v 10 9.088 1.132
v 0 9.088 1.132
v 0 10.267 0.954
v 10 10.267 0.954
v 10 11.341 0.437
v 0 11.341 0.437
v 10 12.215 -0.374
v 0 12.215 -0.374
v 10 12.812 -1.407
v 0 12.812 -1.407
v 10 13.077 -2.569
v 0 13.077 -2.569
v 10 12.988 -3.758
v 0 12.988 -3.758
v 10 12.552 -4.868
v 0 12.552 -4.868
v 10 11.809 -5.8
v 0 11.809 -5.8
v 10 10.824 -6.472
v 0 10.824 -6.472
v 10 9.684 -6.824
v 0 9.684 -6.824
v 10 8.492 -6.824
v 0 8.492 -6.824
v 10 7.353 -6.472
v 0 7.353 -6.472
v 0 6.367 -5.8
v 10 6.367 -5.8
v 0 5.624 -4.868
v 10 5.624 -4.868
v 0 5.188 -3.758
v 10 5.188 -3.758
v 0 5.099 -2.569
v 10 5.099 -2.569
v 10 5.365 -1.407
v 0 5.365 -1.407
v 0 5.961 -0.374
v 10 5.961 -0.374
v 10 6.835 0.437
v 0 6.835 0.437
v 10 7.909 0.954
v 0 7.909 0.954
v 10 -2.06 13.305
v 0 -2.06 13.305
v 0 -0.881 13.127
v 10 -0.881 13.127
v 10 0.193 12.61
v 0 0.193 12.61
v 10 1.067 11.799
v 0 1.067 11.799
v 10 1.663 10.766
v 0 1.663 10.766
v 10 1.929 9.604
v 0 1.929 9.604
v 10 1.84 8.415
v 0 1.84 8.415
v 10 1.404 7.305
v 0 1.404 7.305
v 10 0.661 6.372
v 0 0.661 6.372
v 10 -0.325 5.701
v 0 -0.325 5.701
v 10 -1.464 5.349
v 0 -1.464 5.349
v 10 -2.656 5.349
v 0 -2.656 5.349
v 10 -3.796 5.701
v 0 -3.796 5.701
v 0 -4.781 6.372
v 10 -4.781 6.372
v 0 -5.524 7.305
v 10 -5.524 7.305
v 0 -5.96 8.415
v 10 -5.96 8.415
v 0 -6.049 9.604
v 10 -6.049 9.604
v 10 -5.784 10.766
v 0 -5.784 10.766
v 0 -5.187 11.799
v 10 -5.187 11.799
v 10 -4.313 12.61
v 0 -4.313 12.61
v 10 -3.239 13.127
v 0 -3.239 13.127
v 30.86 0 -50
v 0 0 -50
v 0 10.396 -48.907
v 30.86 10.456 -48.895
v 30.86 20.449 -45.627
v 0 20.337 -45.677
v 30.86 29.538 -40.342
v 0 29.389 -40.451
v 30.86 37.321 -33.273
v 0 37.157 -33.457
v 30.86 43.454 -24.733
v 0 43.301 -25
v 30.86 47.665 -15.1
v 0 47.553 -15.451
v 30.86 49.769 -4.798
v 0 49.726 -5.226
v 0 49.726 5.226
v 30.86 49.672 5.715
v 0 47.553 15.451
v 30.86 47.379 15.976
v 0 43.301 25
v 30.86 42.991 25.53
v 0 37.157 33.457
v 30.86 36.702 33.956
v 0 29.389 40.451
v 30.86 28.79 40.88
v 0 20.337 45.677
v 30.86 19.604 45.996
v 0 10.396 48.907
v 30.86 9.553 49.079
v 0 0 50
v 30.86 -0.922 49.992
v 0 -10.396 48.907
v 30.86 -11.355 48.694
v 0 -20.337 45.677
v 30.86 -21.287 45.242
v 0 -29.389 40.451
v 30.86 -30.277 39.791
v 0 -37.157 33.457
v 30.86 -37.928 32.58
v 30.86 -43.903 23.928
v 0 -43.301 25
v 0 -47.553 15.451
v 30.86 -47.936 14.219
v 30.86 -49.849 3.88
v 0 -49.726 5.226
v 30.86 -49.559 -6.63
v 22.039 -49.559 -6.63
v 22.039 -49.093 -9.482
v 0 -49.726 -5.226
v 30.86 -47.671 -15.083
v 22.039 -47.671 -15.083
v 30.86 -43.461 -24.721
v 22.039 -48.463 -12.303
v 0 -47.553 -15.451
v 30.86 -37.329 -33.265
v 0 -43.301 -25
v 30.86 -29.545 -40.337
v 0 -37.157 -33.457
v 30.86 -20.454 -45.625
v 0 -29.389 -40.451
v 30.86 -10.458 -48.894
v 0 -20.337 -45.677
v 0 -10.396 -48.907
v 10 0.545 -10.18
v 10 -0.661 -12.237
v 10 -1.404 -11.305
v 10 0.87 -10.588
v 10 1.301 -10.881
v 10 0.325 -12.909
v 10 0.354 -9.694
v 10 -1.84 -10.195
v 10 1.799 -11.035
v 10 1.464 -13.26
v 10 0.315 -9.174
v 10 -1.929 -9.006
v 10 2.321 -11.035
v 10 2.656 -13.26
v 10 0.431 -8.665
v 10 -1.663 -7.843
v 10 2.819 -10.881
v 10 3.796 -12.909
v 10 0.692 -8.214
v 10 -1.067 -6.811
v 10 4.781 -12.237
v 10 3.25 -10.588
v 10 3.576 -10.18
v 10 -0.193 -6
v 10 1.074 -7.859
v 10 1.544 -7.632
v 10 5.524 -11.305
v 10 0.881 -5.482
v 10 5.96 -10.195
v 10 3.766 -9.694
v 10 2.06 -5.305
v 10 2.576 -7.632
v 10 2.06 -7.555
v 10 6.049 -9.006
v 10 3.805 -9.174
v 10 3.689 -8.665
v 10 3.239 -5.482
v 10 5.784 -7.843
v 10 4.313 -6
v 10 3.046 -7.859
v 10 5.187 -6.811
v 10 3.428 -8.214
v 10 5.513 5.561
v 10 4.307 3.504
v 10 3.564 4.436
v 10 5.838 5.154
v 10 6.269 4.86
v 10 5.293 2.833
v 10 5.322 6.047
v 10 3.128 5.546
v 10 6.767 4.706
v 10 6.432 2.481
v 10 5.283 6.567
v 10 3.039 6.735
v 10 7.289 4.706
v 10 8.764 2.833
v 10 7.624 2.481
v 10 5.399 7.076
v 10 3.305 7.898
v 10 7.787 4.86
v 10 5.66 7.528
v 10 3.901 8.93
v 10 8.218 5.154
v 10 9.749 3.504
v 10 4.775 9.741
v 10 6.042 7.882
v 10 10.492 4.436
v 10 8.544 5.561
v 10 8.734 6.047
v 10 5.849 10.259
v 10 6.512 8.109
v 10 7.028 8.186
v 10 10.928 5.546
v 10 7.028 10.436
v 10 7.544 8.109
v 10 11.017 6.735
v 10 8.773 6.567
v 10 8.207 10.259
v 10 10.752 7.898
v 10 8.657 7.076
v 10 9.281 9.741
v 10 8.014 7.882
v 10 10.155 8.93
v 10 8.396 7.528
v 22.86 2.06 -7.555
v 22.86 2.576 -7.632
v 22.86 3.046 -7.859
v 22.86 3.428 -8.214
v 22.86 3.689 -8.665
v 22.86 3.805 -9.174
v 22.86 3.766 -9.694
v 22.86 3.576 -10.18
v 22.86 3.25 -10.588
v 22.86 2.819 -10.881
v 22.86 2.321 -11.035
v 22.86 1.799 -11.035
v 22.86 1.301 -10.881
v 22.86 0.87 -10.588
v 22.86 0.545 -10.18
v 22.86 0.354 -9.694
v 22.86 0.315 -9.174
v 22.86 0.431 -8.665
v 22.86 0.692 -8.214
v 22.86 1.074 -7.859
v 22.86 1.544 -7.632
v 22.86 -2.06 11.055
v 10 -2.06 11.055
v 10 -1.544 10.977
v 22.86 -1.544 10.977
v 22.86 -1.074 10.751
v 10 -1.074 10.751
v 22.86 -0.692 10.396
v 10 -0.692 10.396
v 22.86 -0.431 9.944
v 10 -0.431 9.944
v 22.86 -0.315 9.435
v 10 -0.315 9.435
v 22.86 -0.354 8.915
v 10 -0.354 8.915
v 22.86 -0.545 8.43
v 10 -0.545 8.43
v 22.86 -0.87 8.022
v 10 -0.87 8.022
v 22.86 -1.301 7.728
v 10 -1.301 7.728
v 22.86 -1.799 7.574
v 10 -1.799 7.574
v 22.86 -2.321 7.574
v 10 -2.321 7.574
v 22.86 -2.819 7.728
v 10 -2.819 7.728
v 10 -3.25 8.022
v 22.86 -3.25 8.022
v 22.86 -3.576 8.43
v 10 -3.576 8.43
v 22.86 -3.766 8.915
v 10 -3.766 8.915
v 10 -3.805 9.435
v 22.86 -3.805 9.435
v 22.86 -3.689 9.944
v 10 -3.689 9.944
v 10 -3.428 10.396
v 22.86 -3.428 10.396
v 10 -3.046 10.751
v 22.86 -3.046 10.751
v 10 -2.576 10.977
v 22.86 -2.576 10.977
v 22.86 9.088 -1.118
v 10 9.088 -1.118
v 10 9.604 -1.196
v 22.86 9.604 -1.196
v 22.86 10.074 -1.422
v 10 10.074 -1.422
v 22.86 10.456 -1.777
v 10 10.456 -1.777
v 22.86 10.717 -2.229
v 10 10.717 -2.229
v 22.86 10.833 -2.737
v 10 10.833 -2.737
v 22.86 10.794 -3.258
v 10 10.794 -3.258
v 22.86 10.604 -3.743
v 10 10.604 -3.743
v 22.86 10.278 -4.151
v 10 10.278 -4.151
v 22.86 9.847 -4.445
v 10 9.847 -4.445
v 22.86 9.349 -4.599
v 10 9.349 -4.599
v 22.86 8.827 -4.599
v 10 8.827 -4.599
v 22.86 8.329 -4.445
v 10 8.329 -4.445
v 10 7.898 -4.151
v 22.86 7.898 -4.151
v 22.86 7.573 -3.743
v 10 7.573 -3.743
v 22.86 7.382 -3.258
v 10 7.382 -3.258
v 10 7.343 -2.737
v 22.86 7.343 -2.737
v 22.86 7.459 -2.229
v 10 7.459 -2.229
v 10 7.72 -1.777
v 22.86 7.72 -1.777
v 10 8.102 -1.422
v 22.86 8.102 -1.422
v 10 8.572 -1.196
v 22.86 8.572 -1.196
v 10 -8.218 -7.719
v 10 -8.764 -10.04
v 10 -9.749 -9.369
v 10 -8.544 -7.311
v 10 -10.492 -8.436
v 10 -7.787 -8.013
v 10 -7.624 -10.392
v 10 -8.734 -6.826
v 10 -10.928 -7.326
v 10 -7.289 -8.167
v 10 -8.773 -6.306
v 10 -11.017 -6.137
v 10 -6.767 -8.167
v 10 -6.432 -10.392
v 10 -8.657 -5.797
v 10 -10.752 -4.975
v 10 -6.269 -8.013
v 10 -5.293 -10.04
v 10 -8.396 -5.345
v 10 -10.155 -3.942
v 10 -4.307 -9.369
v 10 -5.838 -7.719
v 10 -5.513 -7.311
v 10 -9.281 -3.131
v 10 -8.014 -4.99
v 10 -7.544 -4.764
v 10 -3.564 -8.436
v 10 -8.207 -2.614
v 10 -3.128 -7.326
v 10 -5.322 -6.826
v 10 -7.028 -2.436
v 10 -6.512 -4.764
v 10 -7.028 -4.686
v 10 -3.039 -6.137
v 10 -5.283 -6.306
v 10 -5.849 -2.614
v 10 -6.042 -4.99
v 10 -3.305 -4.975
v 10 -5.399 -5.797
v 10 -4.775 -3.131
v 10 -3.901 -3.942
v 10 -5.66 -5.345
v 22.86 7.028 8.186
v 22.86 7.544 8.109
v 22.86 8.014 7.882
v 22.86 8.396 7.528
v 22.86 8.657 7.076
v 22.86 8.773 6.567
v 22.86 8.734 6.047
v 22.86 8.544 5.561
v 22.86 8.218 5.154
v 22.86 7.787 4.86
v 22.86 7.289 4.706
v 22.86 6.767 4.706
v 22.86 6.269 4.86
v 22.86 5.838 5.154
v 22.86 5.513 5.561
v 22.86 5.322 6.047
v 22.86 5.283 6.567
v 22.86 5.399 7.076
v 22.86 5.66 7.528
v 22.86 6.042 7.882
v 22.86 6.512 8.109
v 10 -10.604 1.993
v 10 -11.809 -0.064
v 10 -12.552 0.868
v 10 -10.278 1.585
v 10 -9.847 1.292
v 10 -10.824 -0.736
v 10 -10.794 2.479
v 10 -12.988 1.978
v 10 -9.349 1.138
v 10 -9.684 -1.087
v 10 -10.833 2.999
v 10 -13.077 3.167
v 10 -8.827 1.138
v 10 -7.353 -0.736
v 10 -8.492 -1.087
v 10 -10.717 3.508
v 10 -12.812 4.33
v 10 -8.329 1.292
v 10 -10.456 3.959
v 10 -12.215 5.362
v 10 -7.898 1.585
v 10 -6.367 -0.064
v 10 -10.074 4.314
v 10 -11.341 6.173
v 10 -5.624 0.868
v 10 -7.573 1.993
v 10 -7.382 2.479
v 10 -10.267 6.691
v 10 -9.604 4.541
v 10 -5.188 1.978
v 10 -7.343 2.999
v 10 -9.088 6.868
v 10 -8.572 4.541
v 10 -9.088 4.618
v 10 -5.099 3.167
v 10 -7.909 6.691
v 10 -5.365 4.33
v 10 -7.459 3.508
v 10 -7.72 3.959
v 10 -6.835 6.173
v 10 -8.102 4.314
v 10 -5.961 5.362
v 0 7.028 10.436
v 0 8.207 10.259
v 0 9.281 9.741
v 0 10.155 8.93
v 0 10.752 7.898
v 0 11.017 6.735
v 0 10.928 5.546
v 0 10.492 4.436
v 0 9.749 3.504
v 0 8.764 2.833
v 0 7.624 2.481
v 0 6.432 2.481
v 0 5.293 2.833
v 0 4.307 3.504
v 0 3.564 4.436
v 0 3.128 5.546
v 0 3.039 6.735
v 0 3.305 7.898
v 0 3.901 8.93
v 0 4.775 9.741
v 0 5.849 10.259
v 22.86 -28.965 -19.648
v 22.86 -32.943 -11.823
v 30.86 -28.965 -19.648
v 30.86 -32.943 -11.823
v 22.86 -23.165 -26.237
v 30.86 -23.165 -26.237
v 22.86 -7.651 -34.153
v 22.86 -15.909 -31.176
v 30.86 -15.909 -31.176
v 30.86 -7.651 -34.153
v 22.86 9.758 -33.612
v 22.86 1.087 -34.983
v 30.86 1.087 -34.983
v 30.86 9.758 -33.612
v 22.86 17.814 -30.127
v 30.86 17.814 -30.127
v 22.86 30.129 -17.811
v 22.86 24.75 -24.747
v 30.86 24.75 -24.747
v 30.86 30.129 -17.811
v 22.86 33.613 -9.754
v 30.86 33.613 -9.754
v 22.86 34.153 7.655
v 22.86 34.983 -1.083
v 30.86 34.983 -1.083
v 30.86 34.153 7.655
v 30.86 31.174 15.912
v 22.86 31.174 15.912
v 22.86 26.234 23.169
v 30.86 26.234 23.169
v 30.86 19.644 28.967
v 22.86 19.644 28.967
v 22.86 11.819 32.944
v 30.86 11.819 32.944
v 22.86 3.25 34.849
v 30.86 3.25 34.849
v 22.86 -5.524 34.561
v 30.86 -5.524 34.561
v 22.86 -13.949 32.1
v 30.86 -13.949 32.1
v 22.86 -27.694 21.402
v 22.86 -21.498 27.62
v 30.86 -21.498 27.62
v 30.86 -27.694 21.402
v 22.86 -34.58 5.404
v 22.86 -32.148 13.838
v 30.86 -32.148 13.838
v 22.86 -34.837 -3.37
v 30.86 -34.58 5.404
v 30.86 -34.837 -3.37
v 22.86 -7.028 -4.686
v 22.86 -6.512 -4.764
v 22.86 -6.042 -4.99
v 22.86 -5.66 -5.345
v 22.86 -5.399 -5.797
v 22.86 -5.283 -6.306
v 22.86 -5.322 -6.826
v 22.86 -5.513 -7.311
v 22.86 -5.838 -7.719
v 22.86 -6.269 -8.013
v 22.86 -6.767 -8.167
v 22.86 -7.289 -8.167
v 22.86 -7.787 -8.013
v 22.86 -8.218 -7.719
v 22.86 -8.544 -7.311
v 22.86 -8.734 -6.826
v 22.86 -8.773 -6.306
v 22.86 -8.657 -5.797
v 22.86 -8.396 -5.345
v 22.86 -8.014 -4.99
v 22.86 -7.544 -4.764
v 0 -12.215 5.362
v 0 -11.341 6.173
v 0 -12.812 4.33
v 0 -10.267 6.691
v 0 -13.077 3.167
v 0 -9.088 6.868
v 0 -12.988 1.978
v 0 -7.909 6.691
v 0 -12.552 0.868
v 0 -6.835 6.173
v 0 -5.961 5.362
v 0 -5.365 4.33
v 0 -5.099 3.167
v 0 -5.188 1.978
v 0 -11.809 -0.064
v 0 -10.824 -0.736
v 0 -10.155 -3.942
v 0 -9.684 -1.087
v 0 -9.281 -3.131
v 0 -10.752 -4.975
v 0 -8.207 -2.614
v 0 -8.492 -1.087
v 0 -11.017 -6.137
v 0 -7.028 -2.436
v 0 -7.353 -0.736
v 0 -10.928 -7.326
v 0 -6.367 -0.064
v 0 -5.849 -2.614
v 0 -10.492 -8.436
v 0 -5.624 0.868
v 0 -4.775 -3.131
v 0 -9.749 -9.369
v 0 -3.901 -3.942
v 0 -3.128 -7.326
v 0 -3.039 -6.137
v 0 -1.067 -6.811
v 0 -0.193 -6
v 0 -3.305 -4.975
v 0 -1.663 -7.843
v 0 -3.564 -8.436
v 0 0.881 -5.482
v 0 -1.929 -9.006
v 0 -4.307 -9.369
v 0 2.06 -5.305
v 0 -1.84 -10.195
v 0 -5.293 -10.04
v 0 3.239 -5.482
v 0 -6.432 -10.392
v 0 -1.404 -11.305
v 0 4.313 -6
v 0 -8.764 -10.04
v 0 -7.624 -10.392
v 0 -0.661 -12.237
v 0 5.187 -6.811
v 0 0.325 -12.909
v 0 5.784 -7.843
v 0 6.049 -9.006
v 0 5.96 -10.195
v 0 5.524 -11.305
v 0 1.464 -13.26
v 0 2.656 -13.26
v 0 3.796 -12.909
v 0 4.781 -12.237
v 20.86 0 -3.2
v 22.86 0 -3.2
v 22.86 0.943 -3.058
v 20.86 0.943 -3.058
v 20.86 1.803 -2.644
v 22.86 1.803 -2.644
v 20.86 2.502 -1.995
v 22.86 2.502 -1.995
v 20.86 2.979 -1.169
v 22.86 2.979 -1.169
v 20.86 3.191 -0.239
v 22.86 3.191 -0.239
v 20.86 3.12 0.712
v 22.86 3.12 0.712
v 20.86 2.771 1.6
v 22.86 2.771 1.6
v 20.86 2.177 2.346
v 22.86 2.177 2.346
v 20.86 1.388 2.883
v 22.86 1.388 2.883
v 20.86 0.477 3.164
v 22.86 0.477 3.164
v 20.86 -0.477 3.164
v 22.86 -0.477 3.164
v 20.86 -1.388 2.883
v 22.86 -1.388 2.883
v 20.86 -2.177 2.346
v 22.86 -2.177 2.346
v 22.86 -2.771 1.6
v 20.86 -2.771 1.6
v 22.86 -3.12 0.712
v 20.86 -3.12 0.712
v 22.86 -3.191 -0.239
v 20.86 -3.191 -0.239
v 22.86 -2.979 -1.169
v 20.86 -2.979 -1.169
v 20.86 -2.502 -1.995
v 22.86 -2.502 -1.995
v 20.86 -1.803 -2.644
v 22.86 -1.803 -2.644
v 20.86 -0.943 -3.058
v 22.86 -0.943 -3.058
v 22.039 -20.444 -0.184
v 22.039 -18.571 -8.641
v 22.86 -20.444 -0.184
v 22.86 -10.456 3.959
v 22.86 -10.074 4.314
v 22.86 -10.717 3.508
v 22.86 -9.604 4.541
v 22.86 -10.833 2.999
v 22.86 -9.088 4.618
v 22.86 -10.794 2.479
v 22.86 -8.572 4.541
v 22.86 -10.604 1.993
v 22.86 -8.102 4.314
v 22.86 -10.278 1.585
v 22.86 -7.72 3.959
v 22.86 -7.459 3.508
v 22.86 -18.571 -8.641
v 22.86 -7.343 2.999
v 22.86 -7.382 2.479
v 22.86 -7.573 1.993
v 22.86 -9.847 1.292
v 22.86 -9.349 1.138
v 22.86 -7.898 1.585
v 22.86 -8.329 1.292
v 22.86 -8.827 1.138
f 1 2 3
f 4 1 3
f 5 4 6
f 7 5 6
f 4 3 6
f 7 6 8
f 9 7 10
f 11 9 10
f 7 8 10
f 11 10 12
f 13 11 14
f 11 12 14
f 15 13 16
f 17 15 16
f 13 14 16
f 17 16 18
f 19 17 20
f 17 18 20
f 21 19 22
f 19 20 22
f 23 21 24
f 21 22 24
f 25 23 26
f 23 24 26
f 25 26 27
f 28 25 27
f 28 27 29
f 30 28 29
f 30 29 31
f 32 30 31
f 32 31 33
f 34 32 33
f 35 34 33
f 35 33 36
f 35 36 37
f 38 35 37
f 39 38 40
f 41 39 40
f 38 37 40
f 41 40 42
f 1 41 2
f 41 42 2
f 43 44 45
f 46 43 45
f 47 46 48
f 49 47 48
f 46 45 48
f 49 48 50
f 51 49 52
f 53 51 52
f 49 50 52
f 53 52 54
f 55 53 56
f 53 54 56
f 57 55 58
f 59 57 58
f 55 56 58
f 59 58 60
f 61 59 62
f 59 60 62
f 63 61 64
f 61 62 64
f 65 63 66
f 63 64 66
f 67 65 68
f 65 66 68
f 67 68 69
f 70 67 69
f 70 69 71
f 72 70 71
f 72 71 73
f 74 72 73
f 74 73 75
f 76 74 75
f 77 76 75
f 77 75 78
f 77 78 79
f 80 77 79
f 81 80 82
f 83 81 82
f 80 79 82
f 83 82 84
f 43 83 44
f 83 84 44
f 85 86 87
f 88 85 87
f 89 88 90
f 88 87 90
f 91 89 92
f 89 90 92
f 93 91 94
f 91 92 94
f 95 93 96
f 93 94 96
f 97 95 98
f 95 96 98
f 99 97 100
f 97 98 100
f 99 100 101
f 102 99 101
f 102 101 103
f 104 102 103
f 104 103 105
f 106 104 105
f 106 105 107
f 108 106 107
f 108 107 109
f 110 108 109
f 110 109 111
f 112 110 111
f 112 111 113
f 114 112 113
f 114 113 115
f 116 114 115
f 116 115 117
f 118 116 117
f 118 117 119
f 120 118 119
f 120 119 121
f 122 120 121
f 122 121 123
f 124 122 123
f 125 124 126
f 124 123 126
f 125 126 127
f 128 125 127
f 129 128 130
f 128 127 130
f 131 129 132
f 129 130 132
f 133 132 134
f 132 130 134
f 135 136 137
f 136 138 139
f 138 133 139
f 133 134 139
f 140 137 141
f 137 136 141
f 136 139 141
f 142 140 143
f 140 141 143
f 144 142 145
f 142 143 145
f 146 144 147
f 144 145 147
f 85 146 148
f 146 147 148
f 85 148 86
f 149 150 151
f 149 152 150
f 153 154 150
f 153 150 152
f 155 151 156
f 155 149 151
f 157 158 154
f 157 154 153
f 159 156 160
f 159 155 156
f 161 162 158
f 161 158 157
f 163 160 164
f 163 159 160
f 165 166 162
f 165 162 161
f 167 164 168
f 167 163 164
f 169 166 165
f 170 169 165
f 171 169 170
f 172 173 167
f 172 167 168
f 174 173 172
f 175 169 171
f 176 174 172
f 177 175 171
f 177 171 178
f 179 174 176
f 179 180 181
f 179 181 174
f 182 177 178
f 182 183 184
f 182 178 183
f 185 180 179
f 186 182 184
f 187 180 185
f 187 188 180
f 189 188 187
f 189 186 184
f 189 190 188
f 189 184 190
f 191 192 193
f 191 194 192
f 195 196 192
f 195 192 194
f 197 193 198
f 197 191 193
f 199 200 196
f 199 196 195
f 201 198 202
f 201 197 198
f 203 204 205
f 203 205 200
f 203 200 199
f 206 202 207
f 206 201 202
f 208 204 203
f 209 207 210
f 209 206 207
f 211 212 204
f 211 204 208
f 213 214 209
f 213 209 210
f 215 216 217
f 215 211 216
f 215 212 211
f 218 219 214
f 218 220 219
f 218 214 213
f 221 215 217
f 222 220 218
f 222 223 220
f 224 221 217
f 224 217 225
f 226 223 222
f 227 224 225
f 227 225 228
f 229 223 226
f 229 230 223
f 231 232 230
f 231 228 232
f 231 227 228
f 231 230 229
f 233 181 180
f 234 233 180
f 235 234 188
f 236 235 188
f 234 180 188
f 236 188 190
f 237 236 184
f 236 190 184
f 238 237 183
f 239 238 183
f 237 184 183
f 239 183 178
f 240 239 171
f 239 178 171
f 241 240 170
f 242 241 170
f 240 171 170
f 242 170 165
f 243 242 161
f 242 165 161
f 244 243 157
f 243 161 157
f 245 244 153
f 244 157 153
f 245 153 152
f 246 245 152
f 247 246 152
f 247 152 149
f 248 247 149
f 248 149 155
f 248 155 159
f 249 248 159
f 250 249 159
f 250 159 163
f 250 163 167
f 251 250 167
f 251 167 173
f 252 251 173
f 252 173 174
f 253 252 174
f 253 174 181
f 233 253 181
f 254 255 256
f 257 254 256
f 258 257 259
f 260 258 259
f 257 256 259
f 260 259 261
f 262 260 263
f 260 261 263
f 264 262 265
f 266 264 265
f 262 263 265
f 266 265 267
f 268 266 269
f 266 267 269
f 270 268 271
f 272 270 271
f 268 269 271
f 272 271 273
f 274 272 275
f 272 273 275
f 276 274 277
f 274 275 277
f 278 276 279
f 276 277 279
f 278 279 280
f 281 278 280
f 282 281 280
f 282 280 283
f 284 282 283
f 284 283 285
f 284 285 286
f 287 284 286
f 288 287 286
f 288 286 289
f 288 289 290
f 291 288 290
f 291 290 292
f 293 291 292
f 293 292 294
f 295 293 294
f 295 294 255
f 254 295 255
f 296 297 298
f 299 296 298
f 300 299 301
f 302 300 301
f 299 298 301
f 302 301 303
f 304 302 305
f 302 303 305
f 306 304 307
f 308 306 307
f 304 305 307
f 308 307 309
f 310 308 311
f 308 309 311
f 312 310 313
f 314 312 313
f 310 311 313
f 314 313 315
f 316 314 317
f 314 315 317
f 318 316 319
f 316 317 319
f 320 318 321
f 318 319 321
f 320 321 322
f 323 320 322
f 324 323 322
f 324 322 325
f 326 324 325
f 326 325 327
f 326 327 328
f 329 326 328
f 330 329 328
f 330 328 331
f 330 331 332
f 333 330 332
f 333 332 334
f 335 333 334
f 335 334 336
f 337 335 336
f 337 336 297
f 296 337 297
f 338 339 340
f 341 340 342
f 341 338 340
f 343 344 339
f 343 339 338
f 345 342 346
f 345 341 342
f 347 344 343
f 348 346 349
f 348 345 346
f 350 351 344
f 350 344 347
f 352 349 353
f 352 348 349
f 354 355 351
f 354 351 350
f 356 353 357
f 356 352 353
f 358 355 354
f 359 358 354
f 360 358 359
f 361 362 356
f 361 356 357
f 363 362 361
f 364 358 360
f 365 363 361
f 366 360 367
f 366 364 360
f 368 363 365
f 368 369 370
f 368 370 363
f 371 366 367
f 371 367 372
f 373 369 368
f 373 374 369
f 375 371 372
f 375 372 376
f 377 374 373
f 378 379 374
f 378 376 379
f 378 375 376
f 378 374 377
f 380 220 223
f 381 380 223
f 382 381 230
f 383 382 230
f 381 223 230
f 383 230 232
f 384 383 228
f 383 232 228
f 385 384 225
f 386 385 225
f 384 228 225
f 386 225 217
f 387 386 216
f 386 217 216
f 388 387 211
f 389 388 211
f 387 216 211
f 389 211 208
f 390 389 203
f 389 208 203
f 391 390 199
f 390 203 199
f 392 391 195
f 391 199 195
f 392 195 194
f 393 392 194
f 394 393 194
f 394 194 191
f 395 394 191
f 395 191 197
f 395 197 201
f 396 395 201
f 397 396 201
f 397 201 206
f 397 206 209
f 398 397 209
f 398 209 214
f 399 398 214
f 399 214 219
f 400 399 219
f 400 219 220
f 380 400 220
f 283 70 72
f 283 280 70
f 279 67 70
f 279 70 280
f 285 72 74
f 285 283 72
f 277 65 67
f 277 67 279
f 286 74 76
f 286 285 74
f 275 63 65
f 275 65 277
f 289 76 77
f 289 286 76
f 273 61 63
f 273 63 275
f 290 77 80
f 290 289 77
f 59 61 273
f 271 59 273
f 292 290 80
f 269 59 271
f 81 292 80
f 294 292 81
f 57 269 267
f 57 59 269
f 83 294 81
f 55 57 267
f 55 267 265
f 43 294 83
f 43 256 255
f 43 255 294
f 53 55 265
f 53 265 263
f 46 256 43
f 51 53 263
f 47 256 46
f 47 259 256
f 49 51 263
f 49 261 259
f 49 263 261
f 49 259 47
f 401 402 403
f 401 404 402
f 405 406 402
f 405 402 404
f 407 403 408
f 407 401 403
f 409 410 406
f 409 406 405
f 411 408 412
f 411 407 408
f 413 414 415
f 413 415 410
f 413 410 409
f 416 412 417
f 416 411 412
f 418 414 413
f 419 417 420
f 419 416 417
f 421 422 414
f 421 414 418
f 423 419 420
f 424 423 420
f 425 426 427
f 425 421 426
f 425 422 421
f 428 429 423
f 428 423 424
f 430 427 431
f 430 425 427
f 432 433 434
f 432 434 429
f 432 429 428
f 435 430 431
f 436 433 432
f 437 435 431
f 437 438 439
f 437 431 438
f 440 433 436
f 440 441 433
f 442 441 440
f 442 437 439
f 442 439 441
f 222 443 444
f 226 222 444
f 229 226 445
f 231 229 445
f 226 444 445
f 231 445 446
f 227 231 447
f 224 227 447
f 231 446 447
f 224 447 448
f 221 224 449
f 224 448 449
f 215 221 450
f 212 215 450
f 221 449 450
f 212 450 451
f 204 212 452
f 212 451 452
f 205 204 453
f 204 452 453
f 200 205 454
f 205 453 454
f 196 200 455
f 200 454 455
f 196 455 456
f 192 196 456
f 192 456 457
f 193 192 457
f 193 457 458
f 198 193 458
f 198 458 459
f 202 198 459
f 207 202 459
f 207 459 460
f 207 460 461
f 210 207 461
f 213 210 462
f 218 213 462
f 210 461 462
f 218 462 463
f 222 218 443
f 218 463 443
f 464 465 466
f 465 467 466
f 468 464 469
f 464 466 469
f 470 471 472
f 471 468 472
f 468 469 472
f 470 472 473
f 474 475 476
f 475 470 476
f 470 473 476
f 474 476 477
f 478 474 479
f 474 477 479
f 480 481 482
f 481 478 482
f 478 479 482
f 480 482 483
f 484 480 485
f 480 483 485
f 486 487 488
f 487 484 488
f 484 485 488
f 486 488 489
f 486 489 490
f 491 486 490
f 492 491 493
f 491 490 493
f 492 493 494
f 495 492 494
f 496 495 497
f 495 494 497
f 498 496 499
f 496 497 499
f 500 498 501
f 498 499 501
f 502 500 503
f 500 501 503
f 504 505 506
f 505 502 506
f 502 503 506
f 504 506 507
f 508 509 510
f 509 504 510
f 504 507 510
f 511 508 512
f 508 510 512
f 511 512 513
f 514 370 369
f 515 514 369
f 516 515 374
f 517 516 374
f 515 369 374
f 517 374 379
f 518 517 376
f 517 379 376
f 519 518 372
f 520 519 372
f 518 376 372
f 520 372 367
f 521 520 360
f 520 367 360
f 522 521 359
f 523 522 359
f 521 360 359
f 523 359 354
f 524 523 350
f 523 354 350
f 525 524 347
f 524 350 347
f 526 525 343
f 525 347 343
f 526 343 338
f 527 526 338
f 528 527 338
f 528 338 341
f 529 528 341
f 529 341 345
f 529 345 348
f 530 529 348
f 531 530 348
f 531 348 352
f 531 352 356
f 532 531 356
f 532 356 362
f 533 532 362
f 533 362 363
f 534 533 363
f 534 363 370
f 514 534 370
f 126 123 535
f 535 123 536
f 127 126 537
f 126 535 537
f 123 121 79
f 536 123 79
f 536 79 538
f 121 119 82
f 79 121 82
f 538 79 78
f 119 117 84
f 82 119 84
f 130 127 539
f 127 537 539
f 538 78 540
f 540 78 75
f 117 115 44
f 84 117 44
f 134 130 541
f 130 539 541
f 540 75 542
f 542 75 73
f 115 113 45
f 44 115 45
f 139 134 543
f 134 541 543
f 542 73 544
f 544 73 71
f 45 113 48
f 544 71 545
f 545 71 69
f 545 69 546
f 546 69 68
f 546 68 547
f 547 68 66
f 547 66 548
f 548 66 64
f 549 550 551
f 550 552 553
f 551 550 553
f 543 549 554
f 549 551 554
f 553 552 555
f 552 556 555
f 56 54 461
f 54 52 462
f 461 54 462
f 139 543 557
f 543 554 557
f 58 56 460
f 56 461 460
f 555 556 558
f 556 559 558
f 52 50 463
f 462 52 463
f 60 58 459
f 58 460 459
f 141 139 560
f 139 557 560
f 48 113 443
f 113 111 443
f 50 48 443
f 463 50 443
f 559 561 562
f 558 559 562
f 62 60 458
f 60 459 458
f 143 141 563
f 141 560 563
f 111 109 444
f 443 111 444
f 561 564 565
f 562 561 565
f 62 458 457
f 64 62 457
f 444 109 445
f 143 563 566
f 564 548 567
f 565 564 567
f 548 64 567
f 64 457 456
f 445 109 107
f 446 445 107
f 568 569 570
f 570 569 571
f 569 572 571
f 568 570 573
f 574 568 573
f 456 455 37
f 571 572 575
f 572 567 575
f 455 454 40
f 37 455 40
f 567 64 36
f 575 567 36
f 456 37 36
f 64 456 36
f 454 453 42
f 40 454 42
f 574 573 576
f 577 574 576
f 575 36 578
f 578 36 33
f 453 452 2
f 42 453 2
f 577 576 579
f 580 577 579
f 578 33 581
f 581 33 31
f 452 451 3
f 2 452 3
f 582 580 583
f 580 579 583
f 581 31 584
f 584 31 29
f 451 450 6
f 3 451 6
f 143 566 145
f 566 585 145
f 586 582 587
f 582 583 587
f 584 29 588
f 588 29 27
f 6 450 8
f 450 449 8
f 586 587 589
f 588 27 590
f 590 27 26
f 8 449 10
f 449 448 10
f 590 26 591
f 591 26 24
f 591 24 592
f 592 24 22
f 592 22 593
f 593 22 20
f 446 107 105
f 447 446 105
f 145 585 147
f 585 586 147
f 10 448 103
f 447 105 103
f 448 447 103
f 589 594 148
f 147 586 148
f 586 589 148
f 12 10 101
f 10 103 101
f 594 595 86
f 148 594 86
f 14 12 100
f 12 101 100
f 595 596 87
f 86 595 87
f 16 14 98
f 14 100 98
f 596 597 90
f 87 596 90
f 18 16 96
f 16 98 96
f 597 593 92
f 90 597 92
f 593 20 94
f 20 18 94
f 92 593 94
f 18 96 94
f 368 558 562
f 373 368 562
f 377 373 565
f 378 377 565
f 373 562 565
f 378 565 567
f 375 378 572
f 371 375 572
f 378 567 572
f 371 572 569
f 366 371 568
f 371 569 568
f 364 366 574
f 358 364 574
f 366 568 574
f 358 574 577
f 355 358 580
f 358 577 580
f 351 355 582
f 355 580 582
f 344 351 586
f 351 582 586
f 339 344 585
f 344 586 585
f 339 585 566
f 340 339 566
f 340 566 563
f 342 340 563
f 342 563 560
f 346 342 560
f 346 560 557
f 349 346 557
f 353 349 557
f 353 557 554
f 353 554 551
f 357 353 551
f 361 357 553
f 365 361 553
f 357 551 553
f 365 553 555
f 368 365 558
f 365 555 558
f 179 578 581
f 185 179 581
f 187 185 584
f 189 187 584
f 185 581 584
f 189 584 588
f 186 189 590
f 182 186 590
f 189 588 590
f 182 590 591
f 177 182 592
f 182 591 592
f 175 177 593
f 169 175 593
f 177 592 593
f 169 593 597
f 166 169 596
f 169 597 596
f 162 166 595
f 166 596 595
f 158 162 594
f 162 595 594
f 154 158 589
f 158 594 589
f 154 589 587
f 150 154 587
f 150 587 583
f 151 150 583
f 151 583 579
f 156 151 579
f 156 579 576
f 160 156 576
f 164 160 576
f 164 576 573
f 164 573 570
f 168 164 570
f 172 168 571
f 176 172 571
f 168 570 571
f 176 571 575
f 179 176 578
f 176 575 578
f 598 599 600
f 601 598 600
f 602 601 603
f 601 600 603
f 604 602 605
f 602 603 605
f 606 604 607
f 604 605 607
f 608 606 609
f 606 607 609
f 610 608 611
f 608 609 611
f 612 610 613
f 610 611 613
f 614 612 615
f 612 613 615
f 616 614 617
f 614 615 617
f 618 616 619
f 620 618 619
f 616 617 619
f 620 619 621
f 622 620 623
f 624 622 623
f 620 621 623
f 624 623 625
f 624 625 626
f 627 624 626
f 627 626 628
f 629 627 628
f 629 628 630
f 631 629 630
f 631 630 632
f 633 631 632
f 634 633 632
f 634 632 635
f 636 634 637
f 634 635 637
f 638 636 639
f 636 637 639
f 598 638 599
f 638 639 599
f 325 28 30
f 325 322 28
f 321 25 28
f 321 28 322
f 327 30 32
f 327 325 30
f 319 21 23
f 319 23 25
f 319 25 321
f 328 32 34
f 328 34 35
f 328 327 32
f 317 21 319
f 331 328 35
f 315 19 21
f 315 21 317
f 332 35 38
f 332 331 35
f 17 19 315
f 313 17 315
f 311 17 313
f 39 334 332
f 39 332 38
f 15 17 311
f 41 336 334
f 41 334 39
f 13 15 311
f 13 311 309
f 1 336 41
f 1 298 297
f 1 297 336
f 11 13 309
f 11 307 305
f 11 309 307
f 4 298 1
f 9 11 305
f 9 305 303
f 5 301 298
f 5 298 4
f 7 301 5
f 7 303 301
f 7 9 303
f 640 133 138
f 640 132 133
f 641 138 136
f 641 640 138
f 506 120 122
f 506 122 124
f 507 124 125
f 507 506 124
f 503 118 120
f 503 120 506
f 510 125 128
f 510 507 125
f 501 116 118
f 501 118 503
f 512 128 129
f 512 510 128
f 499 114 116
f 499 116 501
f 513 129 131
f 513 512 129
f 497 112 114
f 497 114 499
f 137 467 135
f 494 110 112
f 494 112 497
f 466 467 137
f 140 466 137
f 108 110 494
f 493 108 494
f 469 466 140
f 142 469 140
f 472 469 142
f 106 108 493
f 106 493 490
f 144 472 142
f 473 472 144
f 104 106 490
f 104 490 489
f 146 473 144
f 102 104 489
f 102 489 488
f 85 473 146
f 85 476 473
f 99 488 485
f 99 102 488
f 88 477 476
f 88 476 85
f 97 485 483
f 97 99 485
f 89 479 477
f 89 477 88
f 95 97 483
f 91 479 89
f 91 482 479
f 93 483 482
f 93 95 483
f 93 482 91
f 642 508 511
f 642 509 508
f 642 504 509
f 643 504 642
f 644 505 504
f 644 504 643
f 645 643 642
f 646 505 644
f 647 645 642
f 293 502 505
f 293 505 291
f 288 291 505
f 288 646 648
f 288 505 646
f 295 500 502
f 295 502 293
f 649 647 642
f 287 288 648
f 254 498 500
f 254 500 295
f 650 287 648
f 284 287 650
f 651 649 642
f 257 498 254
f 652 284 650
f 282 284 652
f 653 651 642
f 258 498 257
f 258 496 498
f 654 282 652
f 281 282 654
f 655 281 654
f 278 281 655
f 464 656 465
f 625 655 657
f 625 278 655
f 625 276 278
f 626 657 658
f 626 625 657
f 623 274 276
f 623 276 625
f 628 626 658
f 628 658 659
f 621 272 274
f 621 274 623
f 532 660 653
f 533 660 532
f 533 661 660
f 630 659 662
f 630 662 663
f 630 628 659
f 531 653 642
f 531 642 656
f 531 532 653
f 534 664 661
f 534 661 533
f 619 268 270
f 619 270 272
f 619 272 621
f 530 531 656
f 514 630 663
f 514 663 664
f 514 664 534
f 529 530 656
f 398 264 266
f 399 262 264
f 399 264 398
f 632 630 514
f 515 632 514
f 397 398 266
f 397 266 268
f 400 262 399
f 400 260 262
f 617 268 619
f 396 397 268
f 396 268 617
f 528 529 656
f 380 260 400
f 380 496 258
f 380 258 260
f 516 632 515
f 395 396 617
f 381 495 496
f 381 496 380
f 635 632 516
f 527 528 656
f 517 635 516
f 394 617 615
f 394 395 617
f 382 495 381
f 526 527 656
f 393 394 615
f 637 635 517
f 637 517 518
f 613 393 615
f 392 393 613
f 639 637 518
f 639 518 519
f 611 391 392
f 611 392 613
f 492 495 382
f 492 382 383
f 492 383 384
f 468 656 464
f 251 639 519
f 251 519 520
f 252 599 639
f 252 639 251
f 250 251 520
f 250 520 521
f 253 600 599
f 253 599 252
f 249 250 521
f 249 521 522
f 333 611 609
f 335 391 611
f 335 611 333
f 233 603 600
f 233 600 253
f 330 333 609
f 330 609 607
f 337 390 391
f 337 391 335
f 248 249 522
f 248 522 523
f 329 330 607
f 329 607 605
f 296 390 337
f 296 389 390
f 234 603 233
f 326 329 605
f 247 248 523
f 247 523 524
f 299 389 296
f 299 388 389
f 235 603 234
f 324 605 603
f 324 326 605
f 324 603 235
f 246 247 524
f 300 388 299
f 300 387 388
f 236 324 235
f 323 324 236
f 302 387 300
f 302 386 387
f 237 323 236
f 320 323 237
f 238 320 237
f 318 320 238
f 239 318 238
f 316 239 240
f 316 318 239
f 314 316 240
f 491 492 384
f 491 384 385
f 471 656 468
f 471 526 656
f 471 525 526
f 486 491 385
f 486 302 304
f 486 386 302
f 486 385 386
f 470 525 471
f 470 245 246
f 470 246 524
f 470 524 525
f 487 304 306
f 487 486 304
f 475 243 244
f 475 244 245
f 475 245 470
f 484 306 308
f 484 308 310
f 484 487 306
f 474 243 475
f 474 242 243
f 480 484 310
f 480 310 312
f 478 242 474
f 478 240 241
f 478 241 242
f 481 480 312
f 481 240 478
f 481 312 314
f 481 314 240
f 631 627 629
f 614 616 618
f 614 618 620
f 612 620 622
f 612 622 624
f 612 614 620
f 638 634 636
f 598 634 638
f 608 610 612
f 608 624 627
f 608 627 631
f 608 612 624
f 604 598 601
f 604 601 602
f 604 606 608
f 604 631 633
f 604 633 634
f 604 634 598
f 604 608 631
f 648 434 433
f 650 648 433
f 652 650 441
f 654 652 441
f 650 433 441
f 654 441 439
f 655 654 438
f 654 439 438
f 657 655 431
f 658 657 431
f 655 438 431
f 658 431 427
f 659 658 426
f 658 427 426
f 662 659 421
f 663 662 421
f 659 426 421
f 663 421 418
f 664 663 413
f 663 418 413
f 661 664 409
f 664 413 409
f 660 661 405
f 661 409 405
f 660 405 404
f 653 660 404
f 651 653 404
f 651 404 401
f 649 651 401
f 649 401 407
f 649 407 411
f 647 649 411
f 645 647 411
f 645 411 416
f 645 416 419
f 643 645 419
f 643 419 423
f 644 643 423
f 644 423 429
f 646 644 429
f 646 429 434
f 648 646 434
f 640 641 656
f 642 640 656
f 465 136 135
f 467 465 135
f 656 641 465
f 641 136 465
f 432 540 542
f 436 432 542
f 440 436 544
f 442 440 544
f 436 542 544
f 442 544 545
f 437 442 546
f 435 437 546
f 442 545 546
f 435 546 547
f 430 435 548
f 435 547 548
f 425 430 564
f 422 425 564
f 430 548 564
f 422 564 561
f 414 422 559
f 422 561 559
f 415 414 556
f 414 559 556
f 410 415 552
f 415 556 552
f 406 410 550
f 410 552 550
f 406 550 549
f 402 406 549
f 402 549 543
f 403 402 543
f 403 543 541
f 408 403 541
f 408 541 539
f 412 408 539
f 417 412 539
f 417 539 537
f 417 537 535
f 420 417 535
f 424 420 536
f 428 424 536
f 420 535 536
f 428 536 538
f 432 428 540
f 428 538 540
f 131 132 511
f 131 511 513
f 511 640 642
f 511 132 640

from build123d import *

# Parameters (mm, degrees)
SKETCH1_R           = 50
BOSS_EXTRUDE1_DEPTH = 30.86
SKETCH2_R           = 35
CUT_EXTRUDE1_DEPTH  = 8
CUT_EXTRUDE4_START  = -20
SKETCH10_W          = 10.01875972
SKETCH10_H          = 8.661840267
CUT_EXTRUDE4_DEPTH  = 60
SKETCH12_R          = 3.2
CUT_EXTRUDE5_DEPTH  = 2
SKETCH5_R           = 1.75
CUT_EXTRUDE3_DEPTH  = 30
SKETCH8_R           = 4
CUT_EXTRUDE6_DEPTH  = 10


with BuildPart() as part:
    # Sketch1 → Boss-Extrude1 (new body)
    with BuildSketch(Plane(origin=(0, 0, 0), x_dir=(0, 0, -1), z_dir=(1, 0, 0))):
        Circle(SKETCH1_R)
    extrude(amount=BOSS_EXTRUDE1_DEPTH)

    # Sketch2 → Cut-Extrude1 (cut)
    with BuildSketch(Plane(origin=(30.86, 0, 0), x_dir=(0, 0, -1), z_dir=(1, 0, 0))):
        Circle(SKETCH2_R)
    extrude(amount=-CUT_EXTRUDE1_DEPTH, mode=Mode.SUBTRACT)

    # Sketch10 → Cut-Extrude4 (cut)
    with BuildSketch(Plane(origin=(0, 0, 0), x_dir=(1, 0, 0), z_dir=(0, 0.9763565991877232, 0.2161661195066977)).offset(CUT_EXTRUDE4_START)):
        with Locations((27.048757514, 0.091052199)):
            Rectangle(SKETCH10_W, SKETCH10_H)
    extrude(amount=-CUT_EXTRUDE4_DEPTH, mode=Mode.SUBTRACT)

    # Sketch12 → Cut-Extrude5 (cut)
    with BuildSketch(Plane(origin=(22.86, 0, 0), x_dir=(0, 0, -1), z_dir=(1, 0, 0))):
        Circle(SKETCH12_R)
    extrude(amount=-CUT_EXTRUDE5_DEPTH, mode=Mode.SUBTRACT)

    # Sketch5 → Cut-Extrude3 (cut)
    with BuildSketch(Plane.ZY):
        with Locations((2.868272201, -9.088119419)):
            Circle(SKETCH5_R)
        with Locations((-6.436406189, -7.028056301)):
            Circle(SKETCH5_R)
        with Locations((-9.30467839, 2.060063119)):
            Circle(SKETCH5_R)
        with Locations((-2.868272201, 9.088119419)):
            Circle(SKETCH5_R)
        with Locations((6.436406189, 7.028056301)):
            Circle(SKETCH5_R)
        with Locations((9.30467839, -2.060063119)):
            Circle(SKETCH5_R)
    extrude(amount=-CUT_EXTRUDE3_DEPTH, mode=Mode.SUBTRACT)

    # Sketch8 → Cut-Extrude6 (cut)
    with BuildSketch(Plane.ZY):
        with Locations((-2.868272201, 9.088119419)):
            Circle(SKETCH8_R)
        with Locations((6.436406189, 7.028056301)):
            Circle(SKETCH8_R)
        with Locations((9.30467839, -2.060063119)):
            Circle(SKETCH8_R)
        with Locations((2.868272201, -9.088119419)):
            Circle(SKETCH8_R)
        with Locations((-6.436406189, -7.028056301)):
            Circle(SKETCH8_R)
        with Locations((-9.30467839, 2.060063119)):
            Circle(SKETCH8_R)
    extrude(amount=-CUT_EXTRUDE6_DEPTH, mode=Mode.SUBTRACT)


solid = part.part
